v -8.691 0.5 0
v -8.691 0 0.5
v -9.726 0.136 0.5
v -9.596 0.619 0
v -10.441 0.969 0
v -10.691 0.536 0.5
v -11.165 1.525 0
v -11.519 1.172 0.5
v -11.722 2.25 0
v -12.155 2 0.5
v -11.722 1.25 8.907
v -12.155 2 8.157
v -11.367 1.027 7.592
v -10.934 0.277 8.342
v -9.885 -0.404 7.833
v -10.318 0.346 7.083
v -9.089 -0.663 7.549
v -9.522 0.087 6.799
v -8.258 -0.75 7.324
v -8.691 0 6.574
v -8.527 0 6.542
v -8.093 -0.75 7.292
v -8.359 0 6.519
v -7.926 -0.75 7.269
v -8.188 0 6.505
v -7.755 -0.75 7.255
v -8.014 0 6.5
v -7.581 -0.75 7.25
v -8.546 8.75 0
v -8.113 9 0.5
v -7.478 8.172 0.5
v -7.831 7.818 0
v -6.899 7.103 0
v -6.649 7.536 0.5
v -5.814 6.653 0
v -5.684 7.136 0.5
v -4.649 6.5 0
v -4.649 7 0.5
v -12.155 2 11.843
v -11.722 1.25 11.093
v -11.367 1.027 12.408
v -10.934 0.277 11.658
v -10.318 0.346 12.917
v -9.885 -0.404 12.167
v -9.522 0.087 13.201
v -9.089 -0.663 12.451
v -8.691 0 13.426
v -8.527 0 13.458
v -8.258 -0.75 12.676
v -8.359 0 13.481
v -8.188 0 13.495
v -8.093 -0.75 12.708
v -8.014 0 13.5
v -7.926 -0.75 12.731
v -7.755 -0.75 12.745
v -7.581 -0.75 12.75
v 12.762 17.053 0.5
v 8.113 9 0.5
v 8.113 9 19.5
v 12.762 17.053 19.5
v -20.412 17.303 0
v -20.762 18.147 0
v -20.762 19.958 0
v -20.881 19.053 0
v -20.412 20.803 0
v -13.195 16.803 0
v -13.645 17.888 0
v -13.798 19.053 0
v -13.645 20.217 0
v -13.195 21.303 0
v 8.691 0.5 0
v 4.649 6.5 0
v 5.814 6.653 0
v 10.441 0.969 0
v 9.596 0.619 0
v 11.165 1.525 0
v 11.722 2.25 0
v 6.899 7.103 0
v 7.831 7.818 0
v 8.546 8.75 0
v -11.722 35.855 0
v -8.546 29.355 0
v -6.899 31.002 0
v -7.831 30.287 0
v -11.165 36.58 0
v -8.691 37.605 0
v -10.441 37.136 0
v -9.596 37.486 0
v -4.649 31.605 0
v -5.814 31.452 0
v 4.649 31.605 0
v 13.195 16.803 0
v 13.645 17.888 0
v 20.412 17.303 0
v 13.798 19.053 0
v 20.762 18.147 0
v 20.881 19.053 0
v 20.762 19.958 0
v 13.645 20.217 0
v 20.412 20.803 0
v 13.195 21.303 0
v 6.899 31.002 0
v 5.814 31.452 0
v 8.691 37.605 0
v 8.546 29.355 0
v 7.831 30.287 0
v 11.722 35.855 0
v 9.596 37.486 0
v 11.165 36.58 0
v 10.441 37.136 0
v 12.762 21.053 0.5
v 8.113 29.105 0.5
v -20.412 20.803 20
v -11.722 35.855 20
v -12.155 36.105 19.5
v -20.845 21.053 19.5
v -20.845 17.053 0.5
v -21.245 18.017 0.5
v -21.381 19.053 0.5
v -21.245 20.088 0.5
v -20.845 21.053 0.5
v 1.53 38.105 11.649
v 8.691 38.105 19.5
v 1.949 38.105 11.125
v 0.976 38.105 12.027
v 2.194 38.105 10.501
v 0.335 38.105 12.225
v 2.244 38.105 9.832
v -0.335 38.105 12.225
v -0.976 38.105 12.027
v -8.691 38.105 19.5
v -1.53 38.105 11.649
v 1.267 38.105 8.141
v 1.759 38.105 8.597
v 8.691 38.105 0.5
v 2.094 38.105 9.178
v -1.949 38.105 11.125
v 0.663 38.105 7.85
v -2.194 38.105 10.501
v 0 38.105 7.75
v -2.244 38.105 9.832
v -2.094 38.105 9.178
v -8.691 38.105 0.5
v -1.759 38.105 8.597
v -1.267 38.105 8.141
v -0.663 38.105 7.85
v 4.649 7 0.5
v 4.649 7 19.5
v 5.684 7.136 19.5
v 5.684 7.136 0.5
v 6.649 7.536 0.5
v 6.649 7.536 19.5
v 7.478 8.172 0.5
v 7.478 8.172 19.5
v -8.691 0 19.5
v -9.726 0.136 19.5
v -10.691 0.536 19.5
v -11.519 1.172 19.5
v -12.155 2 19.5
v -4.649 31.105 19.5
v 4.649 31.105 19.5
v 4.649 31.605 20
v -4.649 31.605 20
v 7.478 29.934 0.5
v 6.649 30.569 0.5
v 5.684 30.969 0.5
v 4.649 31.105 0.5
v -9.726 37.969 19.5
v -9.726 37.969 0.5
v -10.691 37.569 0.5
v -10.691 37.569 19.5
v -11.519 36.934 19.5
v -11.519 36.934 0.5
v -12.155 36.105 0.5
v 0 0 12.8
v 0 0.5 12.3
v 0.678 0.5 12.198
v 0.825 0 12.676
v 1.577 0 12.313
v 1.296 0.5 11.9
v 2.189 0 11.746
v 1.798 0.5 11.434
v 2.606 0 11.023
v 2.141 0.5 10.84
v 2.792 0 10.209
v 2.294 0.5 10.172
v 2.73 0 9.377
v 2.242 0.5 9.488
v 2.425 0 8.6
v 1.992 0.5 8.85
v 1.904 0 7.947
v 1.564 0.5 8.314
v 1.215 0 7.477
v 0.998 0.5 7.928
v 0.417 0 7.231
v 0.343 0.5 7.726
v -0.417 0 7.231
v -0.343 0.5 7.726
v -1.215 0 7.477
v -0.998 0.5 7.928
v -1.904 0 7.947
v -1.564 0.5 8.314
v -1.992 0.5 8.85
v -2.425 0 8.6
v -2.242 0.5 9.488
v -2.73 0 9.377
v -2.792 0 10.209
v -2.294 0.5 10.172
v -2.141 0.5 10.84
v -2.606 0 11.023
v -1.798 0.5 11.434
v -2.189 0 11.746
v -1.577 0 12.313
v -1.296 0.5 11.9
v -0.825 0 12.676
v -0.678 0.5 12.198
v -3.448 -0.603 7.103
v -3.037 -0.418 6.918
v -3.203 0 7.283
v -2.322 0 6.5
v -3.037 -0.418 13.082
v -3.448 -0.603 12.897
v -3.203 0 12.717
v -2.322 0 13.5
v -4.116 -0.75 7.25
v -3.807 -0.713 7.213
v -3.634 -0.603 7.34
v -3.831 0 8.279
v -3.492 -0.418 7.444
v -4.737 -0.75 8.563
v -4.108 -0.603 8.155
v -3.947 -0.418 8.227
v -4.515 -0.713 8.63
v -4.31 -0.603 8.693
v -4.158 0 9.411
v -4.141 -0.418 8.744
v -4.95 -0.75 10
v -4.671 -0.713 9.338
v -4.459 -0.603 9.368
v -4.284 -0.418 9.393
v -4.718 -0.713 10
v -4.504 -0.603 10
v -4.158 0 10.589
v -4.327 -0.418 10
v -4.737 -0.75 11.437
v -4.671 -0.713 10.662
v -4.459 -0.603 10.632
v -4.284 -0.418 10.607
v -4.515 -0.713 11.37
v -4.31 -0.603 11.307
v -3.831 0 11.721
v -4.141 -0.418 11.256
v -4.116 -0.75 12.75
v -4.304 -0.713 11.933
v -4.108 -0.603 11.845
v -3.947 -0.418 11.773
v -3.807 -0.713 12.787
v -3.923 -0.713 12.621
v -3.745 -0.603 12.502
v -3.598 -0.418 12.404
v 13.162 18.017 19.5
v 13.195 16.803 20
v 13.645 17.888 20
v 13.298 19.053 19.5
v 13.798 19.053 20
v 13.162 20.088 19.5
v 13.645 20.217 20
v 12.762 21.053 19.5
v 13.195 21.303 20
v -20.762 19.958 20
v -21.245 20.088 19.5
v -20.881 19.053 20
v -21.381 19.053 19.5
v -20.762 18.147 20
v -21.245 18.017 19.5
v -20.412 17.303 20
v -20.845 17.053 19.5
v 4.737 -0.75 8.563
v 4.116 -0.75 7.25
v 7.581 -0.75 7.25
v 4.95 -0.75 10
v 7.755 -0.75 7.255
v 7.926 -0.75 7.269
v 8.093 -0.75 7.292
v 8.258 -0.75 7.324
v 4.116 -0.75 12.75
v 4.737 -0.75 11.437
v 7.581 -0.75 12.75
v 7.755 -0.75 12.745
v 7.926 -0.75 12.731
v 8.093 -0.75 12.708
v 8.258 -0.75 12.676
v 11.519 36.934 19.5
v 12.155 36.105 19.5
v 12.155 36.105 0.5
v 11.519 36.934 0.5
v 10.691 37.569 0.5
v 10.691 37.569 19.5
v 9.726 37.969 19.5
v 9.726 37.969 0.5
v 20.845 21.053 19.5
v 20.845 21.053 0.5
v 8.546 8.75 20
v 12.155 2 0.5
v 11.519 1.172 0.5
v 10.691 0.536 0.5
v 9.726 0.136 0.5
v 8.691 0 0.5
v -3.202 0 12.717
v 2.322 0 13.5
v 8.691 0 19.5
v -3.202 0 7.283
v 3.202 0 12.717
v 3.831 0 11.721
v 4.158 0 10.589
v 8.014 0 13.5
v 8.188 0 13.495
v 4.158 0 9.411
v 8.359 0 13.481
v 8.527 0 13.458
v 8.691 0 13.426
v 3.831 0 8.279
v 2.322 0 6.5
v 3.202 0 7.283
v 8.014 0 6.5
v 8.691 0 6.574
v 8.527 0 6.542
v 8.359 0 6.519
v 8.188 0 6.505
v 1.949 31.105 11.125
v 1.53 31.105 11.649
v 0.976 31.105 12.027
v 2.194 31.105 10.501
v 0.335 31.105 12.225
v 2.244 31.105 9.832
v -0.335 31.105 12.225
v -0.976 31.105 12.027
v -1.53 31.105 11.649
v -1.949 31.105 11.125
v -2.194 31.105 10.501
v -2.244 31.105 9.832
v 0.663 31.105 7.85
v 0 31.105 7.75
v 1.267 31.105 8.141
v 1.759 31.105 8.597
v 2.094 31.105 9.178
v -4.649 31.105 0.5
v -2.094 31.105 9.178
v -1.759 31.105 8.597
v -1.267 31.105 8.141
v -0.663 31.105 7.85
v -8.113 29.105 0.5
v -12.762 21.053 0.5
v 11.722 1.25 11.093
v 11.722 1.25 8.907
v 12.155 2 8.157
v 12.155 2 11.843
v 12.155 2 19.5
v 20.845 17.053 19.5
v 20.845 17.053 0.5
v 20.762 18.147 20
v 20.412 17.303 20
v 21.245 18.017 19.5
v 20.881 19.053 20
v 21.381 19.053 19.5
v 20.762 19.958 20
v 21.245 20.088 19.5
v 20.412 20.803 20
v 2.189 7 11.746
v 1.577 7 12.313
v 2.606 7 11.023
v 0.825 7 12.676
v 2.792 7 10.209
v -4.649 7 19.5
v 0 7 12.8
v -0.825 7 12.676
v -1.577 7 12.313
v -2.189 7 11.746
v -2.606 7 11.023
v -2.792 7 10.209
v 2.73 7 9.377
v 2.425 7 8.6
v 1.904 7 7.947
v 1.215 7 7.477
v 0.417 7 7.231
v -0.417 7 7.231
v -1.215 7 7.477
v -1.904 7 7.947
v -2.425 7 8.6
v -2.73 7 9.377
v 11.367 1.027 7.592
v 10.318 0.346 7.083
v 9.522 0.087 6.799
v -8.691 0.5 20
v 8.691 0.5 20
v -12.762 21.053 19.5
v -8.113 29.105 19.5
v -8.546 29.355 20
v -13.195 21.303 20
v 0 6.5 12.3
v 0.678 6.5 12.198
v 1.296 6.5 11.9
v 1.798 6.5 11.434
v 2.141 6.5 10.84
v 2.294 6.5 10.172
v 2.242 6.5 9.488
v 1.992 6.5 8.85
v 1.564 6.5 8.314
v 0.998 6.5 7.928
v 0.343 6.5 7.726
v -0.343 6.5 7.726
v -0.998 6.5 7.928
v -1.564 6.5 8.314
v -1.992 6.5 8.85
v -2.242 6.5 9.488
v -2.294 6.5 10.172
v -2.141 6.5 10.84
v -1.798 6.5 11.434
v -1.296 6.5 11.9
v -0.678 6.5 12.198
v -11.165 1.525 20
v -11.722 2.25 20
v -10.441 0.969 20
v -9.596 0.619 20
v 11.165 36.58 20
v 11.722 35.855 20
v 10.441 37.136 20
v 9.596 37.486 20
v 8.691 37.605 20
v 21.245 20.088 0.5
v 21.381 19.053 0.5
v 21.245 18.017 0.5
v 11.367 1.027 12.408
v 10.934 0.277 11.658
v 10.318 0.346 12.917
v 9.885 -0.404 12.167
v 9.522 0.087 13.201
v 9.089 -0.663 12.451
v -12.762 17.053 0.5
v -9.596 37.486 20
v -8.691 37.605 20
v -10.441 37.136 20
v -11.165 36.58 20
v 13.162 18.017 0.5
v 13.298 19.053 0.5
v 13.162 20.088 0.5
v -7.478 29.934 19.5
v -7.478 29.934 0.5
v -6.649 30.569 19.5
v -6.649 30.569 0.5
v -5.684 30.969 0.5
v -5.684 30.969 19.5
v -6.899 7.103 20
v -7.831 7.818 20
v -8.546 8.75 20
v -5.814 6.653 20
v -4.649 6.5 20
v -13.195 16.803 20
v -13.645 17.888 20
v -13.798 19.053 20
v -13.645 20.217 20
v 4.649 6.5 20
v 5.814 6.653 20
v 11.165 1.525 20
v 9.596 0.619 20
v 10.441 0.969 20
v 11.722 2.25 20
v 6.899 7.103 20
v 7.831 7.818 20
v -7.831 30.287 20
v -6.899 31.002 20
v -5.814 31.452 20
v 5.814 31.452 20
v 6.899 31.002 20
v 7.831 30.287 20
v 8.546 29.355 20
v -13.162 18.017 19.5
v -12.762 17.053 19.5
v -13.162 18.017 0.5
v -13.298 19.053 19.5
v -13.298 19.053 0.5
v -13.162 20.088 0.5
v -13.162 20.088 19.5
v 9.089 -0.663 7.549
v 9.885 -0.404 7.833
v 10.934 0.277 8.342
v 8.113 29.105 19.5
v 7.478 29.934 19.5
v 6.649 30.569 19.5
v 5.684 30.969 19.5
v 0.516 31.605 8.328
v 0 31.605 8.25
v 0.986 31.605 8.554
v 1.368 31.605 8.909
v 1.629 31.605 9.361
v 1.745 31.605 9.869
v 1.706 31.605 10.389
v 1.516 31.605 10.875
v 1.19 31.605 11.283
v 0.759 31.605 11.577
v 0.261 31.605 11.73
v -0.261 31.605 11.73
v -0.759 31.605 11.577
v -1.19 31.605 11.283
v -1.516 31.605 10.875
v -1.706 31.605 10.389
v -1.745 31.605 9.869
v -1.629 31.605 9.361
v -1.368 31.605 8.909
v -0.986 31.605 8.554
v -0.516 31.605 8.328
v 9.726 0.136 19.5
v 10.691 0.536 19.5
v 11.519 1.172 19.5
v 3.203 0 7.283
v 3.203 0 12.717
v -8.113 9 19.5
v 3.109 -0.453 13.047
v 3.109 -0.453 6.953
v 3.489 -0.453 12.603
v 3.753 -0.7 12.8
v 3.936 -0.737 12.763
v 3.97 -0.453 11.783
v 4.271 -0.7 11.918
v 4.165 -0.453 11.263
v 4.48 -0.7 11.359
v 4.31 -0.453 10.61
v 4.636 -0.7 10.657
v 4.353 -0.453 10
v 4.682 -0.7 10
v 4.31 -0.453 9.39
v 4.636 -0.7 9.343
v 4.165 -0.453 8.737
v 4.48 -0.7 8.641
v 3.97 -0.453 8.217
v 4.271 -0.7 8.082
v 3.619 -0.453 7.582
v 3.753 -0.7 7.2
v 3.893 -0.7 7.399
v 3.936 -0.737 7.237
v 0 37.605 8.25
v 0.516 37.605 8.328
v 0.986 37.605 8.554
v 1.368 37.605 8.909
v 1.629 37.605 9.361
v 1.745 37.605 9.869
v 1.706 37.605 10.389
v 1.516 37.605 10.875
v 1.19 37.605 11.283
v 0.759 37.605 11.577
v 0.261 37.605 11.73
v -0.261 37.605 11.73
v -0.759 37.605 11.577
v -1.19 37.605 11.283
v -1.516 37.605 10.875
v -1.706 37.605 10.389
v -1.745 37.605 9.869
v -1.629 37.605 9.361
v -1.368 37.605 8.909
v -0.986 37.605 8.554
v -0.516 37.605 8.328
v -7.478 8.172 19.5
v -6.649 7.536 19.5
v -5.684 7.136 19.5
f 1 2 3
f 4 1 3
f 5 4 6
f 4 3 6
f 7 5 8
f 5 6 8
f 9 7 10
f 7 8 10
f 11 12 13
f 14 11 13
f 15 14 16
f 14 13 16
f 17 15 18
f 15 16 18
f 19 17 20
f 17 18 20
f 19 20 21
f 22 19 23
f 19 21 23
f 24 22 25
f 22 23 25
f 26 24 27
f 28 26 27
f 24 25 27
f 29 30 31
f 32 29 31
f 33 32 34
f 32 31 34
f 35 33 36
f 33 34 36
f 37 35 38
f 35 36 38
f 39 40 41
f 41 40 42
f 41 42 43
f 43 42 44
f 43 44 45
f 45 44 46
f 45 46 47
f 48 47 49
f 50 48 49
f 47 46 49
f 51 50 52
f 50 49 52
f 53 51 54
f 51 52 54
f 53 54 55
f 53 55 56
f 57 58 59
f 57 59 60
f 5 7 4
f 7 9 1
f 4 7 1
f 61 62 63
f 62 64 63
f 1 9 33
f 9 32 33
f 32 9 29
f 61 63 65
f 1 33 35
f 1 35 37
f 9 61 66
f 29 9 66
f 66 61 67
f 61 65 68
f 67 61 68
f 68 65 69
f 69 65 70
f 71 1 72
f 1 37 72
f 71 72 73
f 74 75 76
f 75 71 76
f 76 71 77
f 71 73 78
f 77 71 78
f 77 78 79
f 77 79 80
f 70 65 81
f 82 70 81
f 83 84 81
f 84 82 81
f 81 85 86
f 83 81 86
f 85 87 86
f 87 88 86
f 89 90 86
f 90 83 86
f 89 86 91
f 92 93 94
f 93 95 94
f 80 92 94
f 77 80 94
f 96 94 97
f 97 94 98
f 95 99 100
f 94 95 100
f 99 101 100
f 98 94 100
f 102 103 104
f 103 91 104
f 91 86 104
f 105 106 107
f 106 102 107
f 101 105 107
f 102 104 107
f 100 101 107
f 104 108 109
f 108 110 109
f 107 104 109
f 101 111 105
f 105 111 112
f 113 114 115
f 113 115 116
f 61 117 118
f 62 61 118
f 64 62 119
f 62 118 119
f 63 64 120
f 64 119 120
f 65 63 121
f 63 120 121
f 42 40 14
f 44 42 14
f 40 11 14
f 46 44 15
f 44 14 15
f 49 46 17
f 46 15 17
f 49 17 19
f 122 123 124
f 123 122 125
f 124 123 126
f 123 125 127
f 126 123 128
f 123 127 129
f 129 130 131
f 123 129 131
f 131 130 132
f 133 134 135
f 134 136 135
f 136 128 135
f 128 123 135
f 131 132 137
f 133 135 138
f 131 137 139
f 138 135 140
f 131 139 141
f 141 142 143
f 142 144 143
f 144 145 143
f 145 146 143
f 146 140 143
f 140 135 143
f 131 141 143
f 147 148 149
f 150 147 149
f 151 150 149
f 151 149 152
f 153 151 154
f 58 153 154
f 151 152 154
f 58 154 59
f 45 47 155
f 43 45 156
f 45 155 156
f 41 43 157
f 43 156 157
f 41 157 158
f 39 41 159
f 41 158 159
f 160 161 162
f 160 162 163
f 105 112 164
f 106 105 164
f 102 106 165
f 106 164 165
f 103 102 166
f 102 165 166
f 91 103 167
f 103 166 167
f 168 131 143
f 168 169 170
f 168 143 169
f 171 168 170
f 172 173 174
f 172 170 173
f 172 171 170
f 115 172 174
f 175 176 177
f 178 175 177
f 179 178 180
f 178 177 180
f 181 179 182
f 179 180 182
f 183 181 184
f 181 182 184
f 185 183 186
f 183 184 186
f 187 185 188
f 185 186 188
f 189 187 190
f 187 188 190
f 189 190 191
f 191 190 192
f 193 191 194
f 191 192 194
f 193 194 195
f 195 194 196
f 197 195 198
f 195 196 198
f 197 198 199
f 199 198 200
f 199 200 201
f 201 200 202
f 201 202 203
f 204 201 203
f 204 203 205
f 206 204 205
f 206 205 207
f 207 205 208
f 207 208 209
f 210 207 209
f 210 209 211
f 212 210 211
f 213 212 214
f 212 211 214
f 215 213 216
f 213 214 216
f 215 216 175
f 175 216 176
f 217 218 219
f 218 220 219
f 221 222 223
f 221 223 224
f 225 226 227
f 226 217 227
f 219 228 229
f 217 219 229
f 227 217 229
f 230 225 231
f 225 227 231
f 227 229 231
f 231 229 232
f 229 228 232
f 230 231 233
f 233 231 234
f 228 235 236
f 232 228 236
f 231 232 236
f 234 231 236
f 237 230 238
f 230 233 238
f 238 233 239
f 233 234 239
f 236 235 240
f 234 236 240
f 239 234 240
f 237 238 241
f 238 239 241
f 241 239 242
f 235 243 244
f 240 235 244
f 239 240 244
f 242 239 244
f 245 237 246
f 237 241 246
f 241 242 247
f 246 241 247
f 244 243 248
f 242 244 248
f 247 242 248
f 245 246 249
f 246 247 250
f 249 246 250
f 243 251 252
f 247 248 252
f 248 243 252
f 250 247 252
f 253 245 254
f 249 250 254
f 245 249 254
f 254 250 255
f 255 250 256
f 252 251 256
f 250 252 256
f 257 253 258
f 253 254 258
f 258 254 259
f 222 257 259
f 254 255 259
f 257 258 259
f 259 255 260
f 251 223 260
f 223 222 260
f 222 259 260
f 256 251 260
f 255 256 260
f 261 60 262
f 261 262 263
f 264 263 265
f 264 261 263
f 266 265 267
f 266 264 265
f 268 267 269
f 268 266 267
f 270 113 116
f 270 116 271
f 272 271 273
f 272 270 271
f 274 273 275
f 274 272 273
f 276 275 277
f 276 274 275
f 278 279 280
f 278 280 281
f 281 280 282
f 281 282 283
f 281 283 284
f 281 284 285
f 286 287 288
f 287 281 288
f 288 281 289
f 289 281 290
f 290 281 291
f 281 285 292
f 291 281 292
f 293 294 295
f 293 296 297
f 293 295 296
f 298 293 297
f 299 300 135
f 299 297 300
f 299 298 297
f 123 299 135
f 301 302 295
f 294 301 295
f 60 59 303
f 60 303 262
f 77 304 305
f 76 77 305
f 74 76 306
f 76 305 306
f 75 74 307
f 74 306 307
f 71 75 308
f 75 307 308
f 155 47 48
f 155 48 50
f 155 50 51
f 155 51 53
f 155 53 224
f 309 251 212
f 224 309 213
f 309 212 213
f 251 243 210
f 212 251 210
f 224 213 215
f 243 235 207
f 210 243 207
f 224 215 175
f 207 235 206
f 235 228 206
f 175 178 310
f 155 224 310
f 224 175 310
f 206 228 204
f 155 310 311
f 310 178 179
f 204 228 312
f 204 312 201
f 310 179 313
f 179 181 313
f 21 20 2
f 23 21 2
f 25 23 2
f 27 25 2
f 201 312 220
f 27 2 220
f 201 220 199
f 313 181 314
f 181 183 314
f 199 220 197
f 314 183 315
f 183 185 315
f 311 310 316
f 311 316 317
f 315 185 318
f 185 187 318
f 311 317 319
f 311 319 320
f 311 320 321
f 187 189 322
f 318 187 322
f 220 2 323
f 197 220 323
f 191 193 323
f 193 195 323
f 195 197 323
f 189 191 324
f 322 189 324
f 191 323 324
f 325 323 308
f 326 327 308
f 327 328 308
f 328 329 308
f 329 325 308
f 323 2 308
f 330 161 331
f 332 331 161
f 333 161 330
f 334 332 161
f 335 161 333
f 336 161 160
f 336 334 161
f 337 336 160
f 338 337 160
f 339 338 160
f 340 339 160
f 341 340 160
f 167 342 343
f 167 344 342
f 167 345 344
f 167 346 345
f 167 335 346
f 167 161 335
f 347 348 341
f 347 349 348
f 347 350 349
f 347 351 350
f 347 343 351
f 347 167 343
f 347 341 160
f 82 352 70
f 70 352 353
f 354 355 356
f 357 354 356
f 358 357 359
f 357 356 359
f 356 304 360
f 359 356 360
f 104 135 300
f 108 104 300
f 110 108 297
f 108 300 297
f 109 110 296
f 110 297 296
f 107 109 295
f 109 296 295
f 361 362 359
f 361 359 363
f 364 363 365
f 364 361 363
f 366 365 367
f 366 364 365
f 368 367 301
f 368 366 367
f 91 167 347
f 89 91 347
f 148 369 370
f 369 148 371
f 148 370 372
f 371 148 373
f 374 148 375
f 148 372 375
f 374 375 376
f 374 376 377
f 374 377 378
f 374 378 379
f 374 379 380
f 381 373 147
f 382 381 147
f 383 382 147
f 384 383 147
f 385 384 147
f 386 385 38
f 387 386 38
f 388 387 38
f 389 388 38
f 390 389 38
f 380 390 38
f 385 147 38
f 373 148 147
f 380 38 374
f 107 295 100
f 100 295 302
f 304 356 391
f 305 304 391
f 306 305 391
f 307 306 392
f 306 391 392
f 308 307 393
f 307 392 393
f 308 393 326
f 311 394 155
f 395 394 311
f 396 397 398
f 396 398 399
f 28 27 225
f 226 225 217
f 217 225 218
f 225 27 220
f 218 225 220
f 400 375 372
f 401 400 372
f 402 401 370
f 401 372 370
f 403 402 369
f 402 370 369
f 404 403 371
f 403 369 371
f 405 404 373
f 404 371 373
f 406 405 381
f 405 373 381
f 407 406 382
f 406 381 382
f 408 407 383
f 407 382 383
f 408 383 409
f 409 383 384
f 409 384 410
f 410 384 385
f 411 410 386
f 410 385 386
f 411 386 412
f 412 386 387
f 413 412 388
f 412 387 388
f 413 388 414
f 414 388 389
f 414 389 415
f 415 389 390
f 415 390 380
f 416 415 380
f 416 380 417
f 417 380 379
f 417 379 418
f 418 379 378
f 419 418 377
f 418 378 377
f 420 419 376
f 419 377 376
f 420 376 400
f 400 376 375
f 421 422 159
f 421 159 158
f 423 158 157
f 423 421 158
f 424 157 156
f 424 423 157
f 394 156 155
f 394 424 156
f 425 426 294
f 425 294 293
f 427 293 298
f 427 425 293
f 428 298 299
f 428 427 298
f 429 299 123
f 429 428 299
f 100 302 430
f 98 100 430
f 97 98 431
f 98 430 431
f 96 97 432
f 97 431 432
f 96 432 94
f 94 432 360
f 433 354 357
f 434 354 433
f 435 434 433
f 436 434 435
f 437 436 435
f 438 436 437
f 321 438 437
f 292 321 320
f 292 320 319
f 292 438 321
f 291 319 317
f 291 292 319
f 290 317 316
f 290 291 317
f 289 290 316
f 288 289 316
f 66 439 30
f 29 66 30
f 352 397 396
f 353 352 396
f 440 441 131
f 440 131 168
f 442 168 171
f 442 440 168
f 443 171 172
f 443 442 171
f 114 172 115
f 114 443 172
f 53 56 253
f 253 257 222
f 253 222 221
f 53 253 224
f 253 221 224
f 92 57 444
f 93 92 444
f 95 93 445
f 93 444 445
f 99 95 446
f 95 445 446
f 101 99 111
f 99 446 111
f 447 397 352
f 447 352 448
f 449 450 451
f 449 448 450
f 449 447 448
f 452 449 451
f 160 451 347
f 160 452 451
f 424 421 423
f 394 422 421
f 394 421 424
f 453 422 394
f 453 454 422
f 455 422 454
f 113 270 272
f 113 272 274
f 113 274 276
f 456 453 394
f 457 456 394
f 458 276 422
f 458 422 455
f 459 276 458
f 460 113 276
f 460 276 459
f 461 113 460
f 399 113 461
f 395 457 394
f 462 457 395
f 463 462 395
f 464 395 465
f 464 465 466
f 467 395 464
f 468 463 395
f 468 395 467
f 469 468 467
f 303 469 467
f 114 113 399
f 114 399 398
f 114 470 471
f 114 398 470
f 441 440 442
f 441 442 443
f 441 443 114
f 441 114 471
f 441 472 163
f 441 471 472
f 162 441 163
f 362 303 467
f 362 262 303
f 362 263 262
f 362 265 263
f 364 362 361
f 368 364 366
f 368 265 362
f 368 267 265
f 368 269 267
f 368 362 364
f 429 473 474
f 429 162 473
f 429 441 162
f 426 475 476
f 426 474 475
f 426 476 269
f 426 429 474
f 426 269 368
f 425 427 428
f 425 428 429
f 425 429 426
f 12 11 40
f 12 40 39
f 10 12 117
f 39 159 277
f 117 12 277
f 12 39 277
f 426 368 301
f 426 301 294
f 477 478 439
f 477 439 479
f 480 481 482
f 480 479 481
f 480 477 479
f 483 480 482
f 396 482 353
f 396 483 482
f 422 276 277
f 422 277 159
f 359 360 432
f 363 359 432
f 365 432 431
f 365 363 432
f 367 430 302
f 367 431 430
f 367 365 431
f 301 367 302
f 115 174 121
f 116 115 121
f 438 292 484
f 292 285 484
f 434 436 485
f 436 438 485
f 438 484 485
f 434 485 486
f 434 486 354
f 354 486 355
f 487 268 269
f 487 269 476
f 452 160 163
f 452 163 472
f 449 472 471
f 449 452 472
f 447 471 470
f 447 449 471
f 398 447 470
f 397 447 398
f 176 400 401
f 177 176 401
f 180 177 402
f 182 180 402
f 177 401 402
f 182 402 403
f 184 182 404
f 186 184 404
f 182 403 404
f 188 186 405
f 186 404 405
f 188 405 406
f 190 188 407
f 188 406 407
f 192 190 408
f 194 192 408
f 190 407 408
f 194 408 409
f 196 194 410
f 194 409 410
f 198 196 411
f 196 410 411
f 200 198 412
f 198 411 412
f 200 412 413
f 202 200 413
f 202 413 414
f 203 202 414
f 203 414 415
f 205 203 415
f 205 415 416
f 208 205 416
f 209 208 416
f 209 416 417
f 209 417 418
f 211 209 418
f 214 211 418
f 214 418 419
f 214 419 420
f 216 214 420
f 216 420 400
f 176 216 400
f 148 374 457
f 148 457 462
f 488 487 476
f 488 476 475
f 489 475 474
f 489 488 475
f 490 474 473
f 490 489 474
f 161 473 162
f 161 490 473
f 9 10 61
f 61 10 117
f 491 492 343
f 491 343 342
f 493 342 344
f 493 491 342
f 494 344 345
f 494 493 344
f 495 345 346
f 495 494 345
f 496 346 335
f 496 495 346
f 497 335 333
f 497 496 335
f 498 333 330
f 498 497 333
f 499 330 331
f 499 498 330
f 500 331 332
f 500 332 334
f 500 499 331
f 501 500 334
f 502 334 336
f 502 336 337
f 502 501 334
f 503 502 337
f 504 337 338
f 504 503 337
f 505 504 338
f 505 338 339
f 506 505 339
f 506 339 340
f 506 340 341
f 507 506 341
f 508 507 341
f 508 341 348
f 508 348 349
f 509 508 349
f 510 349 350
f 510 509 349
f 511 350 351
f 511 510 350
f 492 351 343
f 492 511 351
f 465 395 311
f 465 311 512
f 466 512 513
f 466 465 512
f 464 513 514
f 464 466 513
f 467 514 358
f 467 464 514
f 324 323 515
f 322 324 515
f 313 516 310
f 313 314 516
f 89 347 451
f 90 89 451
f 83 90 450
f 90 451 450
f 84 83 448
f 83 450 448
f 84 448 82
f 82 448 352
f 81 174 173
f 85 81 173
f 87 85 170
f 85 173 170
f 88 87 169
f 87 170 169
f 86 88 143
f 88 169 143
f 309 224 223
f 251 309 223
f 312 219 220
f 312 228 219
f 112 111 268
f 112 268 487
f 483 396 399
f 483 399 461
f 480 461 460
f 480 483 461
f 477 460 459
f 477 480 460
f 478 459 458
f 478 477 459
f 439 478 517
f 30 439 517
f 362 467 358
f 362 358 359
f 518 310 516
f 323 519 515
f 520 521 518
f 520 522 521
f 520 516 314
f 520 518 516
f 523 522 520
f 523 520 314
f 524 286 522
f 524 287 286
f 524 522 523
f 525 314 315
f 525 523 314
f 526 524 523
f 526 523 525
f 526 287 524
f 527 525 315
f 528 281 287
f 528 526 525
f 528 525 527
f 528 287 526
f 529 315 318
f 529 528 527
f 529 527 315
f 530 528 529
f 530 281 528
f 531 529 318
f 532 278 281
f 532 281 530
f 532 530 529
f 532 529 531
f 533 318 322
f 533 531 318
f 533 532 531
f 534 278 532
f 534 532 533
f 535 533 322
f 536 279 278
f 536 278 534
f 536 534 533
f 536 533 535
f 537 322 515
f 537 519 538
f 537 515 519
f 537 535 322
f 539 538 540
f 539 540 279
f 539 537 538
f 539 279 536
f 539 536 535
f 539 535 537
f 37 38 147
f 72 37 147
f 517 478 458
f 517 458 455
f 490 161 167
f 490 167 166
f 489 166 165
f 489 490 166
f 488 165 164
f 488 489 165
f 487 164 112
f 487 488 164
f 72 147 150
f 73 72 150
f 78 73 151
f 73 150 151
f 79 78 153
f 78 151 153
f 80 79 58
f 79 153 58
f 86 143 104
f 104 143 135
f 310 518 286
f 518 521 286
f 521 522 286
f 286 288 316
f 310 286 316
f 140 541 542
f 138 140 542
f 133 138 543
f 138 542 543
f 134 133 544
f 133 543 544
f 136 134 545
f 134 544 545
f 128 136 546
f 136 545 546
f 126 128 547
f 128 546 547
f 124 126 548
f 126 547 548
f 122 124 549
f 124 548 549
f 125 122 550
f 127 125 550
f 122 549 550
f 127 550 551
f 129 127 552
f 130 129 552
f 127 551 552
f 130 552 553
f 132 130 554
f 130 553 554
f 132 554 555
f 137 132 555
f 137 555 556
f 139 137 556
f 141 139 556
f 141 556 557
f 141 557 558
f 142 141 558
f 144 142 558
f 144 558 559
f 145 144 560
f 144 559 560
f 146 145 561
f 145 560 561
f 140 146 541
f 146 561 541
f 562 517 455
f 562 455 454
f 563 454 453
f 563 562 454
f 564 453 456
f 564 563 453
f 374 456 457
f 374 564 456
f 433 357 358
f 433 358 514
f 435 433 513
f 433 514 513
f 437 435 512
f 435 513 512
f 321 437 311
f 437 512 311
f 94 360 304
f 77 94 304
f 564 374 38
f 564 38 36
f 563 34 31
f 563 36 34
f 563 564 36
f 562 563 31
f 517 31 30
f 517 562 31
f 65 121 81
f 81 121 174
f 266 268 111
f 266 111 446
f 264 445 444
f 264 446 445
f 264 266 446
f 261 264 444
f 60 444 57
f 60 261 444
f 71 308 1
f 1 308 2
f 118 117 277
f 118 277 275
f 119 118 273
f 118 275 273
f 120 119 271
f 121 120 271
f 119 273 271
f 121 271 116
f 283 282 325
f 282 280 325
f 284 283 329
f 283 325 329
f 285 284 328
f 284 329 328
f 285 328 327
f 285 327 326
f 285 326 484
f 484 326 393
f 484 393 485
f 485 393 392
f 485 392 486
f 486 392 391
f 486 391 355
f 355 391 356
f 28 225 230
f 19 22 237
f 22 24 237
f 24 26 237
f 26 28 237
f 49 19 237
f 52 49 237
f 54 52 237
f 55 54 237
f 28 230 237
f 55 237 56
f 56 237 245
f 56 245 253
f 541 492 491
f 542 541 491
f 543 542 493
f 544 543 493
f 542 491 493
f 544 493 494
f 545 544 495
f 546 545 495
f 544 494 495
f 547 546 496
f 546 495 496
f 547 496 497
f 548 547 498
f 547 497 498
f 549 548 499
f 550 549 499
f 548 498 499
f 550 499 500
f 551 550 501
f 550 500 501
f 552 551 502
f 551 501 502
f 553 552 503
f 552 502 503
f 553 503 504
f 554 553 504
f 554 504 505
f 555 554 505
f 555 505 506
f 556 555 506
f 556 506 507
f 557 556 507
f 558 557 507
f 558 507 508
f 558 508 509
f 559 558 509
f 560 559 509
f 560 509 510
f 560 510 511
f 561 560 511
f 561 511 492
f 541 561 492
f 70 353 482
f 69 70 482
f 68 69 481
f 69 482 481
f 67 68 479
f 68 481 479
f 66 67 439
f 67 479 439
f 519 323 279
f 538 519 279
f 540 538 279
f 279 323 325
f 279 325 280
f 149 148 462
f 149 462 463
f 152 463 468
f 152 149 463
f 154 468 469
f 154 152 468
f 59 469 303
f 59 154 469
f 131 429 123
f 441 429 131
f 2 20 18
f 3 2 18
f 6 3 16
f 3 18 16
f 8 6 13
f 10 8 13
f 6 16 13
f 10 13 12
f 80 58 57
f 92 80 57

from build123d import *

# Parameters (mm, degrees)
AUFSATZ_LINEAR_AUSTRAGEN1_DEPTH             = 20
AUFSATZ_LINEAR_AUSTRAGEN2_REACH             = 50.332
AUFSATZ_LINEAR_AUSTRAGEN2_DIRECTION_2_REACH = 50.332
SKIZZE2_R                                   = 2.3
SCHNITT_LINEAR_AUSTRAGEN1_DEPTH             = 20
SKIZZE4_R                                   = 4.2
SCHNITT_LINEAR_AUSTRAGEN2_DEPTH             = 20
VERRUNDUNG1_R                               = 0.75
VERRUNDUNG2_R                               = 4
SKIZZE5_R                                   = 1.7499999999999998
SCHNITT_LINEAR_AUSTRAGEN3_DEPTH             = 20
FASE1_SIZE                                  = 0.5


with BuildPart() as part:
    # Skizze1 → Aufsatz-Linear austragen1 (new body)
    with BuildSketch(Plane.XY):
        Polygon((-11, 0), (11, 0), (21.999999999999947, 19.052558883257674), (10.999999999999858, 38.10511776651528), (-10.999999999999858, 38.10511776651528), (-21.999999999999947, 19.052558883257674), align=None)
        Polygon((0, 7), (6.958548115672608, 7), (13.917096231345187, 19.052558883257657), (6.958548115672503, 31.105117766515278), (-6.958548115672498, 31.105117766515278), (-13.917096231345184, 19.05255888325765), (-6.958548115672604, 7), align=None, mode=Mode.SUBTRACT)
    extrude(amount=AUFSATZ_LINEAR_AUSTRAGEN1_DEPTH)

    # Aufsatz-Linear austragen2: up to this plane
    aufsatz_linear_austragen2_end = Plane(origin=(11, 0, 20), z_dir=(-0.86602540378444, 0.4999999999999978, 0))
    # Skizze3 → Aufsatz-Linear austragen2 (add, up to the surface)
    with BuildSketch(Plane(origin=(0, 0, 0), x_dir=(0, 0, -1), z_dir=(1, 0, 0)), mode=Mode.PRIVATE) as aufsatz_linear_austragen2_sk1:
        Polygon((-13.5, 8.3e-16), (-6.500000000000001, 8.3e-16), (-7.250000000000007, -0.7499999999999989), (-12.749999999999995, -0.7499999999999989), align=None)
    aufsatz_linear_austragen2_tool1 = split(extrude(aufsatz_linear_austragen2_sk1.sketch, amount=AUFSATZ_LINEAR_AUSTRAGEN2_REACH, mode=Mode.PRIVATE), bisect_by=aufsatz_linear_austragen2_end, keep=Keep.BOTH, mode=Mode.PRIVATE)
    add(aufsatz_linear_austragen2_tool1.solids().sort_by_distance((0, -0.36, 10))[0])

    # Aufsatz-Linear austragen2 direction 2: up to this plane
    aufsatz_linear_austragen2_direction_2_end = Plane(origin=(-11, 0, 20), z_dir=(0.86602540378444, 0.4999999999999978, 0))
    # Skizze3 → Aufsatz-Linear austragen2 direction 2 (add, up to the surface)
    with BuildSketch(Plane(origin=(0, 0, 0), x_dir=(0, 0, -1), z_dir=(1, 0, 0)), mode=Mode.PRIVATE) as aufsatz_linear_austragen2_direction_2_sk1:
        Polygon((-13.5, 8.3e-16), (-6.500000000000001, 8.3e-16), (-7.250000000000007, -0.7499999999999989), (-12.749999999999995, -0.7499999999999989), align=None)
    aufsatz_linear_austragen2_direction_2_tool1 = split(extrude(aufsatz_linear_austragen2_direction_2_sk1.sketch, amount=-AUFSATZ_LINEAR_AUSTRAGEN2_DIRECTION_2_REACH, mode=Mode.PRIVATE), bisect_by=aufsatz_linear_austragen2_direction_2_end, keep=Keep.BOTH, mode=Mode.PRIVATE)
    add(aufsatz_linear_austragen2_direction_2_tool1.solids().sort_by_distance((0, -0.36, 10))[0])

    # Skizze2 → Schnitt-Linear austragen1 (cut)
    with BuildSketch(Plane(origin=(0, 7, 0), x_dir=(1, 0, 0), z_dir=(0, 1, 0))):
        with Locations(Location((6.94e-15, -10, 0), (0, 0, 270))):
            Circle(SKIZZE2_R)
    extrude(amount=-SCHNITT_LINEAR_AUSTRAGEN1_DEPTH, mode=Mode.SUBTRACT)

    # Skizze4 → Schnitt-Linear austragen2 (cut)
    with BuildSketch(Plane.XZ):
        with Locations((6.94e-15, 10)):
            Circle(SKIZZE4_R)
    extrude(amount=SCHNITT_LINEAR_AUSTRAGEN2_DEPTH, mode=Mode.SUBTRACT)

    # Verrundung1
    verrundung1_edges = [part.edges().sort_by_distance(p)[0] for p in [
        (-4.199999999999993, -0.7499999999999989, 10),
        (4.200000000000008, -0.7499999999999989, 10),
    ]]
    fillet(verrundung1_edges, radius=VERRUNDUNG1_R - 0.0001)  # a hair under: the kernel refuses the full size

    # Verrundung2
    verrundung2_edges = [part.edges().sort_by_distance(p)[0] for p in [
        (11, 0, 16.75),
        (-11, 0, 16.75),
        (-21.999999999999947, 19.052558883257674, 10),
        (-10.999999999999858, 38.10511776651528, 10),
        (10.999999999999858, 38.10511776651528, 10),
        (21.999999999999947, 19.052558883257674, 10),
        (-6.958548115672604, 7, 10),
        (6.958548115672608, 7, 10),
        (13.917096231345187, 19.052558883257657, 10),
        (6.958548115672503, 31.105117766515278, 10),
        (-6.958548115672498, 31.105117766515278, 10),
        (-13.917096231345184, 19.05255888325765, 10),
        (11, 0, 3.2500000000000004),
        (-11, 0, 3.2500000000000004),
        (10.783493649053893, -0.3750000000000009, 6.875000000000002),
        (10.566987298107785, -0.749999999999999, 10),
        (10.783493649053893, -0.37499999999999845, 13.124999999999996),
        (-10.783493649053893, -0.37499999999999845, 13.124999999999996),
        (-10.783493649053893, -0.3750000000000009, 6.875000000000002),
        (-10.566987298107785, -0.749999999999999, 10),
    ]]
    fillet(verrundung2_edges, radius=VERRUNDUNG2_R)

    # Skizze5 → Schnitt-Linear austragen3 (cut)
    with BuildSketch(Plane.XZ.offset(-31.105117766515278)):
        with Locations(Location((6.94e-15, 10, 0), (0, 0, 270))):
            Circle(SKIZZE5_R)
    extrude(amount=-SCHNITT_LINEAR_AUSTRAGEN3_DEPTH, mode=Mode.SUBTRACT)

    # Fase1
    fase1_edges = [part.edges().sort_by_distance(p)[0] for p in [
        (-10.437822173508891, 13.026279441628823, 0),
        (-21.38119784648294, 19.052558883257667, 0),
        (-10.69059892324136, 37.569219381653035, 0),
        (10.69059892324136, 37.569219381653035, 0),
        (21.38119784648294, 19.052558883257674, 0),
        (-10.690598923241494, 0.5358983848622438, 0),
        (10.690598923241497, 0.5358983848622478, 0),
        (1.78e-15, 0, 20),
        (16.4999999999999, 28.578838324886483, 20),
        (0, 38.10511776651528, 20),
        (-16.4999999999999, 28.57883832488648, 20),
        (-16.49999999999997, 9.526279441628835, 20),
        (10.437822173508899, 13.02627944162883, 20),
        (8.9e-16, 7, 20),
        (-10.437822173508891, 13.026279441628823, 20),
        (-10.437822173508836, 25.078838324886473, 20),
        (2.66e-15, 31.105117766515278, 20),
        (10.437822173508838, 25.078838324886476, 20),
        (-21.38119784648294, 19.052558883257667, 20),
        (-10.69059892324136, 37.569219381653035, 20),
        (10.69059892324136, 37.569219381653035, 20),
        (21.38119784648294, 19.052558883257674, 20),
        (-10.690598923241494, 0.5358983848622438, 20),
        (10.690598923241497, 0.5358983848622478, 20),
        (13.298294077828178, 19.05255888325766, 0),
        (13.298294077828178, 19.05255888325766, 20),
        (6.649147038914101, 7.535898384862248, 0),
        (6.649147038914101, 7.535898384862248, 20),
        (-6.6491470389141, 7.5358983848622465, 0),
        (-6.6491470389141, 7.5358983848622465, 20),
        (-13.298294077828174, 19.052558883257642, 0),
        (-13.298294077828174, 19.052558883257642, 20),
        (-6.649147038914, 30.56921938165304, 0),
        (-6.649147038914, 30.56921938165304, 20),
        (6.649147038914005, 30.56921938165304, 0),
        (6.649147038914005, 30.56921938165304, 20),
        (7.47e-15, 38.10511776651528, 11.75),
        (7.47e-15, 31.105117766515278, 11.75),
        (7.64e-15, 7, 7.7),
        (7.64e-15, 0, 7.7),
        (16.499999999999975, 9.526279441628839, 0),
        (16.499999999999975, 9.526279441628839, 20),
        (1.78e-15, 0, 0),
        (-16.49999999999997, 9.526279441628835, 0),
        (-16.4999999999999, 28.57883832488648, 0),
        (0, 38.10511776651528, 0),
        (16.4999999999999, 28.578838324886483, 0),
        (0, 7, 0),
        (10.437822173508899, 13.02627944162883, 0),
        (10.437822173508838, 25.078838324886476, 0),
        (2.66e-15, 31.105117766515278, 0),
        (-10.437822173508836, 25.078838324886473, 0),
    ]]
    chamfer(fase1_edges, length=FASE1_SIZE)


solid = part.part
